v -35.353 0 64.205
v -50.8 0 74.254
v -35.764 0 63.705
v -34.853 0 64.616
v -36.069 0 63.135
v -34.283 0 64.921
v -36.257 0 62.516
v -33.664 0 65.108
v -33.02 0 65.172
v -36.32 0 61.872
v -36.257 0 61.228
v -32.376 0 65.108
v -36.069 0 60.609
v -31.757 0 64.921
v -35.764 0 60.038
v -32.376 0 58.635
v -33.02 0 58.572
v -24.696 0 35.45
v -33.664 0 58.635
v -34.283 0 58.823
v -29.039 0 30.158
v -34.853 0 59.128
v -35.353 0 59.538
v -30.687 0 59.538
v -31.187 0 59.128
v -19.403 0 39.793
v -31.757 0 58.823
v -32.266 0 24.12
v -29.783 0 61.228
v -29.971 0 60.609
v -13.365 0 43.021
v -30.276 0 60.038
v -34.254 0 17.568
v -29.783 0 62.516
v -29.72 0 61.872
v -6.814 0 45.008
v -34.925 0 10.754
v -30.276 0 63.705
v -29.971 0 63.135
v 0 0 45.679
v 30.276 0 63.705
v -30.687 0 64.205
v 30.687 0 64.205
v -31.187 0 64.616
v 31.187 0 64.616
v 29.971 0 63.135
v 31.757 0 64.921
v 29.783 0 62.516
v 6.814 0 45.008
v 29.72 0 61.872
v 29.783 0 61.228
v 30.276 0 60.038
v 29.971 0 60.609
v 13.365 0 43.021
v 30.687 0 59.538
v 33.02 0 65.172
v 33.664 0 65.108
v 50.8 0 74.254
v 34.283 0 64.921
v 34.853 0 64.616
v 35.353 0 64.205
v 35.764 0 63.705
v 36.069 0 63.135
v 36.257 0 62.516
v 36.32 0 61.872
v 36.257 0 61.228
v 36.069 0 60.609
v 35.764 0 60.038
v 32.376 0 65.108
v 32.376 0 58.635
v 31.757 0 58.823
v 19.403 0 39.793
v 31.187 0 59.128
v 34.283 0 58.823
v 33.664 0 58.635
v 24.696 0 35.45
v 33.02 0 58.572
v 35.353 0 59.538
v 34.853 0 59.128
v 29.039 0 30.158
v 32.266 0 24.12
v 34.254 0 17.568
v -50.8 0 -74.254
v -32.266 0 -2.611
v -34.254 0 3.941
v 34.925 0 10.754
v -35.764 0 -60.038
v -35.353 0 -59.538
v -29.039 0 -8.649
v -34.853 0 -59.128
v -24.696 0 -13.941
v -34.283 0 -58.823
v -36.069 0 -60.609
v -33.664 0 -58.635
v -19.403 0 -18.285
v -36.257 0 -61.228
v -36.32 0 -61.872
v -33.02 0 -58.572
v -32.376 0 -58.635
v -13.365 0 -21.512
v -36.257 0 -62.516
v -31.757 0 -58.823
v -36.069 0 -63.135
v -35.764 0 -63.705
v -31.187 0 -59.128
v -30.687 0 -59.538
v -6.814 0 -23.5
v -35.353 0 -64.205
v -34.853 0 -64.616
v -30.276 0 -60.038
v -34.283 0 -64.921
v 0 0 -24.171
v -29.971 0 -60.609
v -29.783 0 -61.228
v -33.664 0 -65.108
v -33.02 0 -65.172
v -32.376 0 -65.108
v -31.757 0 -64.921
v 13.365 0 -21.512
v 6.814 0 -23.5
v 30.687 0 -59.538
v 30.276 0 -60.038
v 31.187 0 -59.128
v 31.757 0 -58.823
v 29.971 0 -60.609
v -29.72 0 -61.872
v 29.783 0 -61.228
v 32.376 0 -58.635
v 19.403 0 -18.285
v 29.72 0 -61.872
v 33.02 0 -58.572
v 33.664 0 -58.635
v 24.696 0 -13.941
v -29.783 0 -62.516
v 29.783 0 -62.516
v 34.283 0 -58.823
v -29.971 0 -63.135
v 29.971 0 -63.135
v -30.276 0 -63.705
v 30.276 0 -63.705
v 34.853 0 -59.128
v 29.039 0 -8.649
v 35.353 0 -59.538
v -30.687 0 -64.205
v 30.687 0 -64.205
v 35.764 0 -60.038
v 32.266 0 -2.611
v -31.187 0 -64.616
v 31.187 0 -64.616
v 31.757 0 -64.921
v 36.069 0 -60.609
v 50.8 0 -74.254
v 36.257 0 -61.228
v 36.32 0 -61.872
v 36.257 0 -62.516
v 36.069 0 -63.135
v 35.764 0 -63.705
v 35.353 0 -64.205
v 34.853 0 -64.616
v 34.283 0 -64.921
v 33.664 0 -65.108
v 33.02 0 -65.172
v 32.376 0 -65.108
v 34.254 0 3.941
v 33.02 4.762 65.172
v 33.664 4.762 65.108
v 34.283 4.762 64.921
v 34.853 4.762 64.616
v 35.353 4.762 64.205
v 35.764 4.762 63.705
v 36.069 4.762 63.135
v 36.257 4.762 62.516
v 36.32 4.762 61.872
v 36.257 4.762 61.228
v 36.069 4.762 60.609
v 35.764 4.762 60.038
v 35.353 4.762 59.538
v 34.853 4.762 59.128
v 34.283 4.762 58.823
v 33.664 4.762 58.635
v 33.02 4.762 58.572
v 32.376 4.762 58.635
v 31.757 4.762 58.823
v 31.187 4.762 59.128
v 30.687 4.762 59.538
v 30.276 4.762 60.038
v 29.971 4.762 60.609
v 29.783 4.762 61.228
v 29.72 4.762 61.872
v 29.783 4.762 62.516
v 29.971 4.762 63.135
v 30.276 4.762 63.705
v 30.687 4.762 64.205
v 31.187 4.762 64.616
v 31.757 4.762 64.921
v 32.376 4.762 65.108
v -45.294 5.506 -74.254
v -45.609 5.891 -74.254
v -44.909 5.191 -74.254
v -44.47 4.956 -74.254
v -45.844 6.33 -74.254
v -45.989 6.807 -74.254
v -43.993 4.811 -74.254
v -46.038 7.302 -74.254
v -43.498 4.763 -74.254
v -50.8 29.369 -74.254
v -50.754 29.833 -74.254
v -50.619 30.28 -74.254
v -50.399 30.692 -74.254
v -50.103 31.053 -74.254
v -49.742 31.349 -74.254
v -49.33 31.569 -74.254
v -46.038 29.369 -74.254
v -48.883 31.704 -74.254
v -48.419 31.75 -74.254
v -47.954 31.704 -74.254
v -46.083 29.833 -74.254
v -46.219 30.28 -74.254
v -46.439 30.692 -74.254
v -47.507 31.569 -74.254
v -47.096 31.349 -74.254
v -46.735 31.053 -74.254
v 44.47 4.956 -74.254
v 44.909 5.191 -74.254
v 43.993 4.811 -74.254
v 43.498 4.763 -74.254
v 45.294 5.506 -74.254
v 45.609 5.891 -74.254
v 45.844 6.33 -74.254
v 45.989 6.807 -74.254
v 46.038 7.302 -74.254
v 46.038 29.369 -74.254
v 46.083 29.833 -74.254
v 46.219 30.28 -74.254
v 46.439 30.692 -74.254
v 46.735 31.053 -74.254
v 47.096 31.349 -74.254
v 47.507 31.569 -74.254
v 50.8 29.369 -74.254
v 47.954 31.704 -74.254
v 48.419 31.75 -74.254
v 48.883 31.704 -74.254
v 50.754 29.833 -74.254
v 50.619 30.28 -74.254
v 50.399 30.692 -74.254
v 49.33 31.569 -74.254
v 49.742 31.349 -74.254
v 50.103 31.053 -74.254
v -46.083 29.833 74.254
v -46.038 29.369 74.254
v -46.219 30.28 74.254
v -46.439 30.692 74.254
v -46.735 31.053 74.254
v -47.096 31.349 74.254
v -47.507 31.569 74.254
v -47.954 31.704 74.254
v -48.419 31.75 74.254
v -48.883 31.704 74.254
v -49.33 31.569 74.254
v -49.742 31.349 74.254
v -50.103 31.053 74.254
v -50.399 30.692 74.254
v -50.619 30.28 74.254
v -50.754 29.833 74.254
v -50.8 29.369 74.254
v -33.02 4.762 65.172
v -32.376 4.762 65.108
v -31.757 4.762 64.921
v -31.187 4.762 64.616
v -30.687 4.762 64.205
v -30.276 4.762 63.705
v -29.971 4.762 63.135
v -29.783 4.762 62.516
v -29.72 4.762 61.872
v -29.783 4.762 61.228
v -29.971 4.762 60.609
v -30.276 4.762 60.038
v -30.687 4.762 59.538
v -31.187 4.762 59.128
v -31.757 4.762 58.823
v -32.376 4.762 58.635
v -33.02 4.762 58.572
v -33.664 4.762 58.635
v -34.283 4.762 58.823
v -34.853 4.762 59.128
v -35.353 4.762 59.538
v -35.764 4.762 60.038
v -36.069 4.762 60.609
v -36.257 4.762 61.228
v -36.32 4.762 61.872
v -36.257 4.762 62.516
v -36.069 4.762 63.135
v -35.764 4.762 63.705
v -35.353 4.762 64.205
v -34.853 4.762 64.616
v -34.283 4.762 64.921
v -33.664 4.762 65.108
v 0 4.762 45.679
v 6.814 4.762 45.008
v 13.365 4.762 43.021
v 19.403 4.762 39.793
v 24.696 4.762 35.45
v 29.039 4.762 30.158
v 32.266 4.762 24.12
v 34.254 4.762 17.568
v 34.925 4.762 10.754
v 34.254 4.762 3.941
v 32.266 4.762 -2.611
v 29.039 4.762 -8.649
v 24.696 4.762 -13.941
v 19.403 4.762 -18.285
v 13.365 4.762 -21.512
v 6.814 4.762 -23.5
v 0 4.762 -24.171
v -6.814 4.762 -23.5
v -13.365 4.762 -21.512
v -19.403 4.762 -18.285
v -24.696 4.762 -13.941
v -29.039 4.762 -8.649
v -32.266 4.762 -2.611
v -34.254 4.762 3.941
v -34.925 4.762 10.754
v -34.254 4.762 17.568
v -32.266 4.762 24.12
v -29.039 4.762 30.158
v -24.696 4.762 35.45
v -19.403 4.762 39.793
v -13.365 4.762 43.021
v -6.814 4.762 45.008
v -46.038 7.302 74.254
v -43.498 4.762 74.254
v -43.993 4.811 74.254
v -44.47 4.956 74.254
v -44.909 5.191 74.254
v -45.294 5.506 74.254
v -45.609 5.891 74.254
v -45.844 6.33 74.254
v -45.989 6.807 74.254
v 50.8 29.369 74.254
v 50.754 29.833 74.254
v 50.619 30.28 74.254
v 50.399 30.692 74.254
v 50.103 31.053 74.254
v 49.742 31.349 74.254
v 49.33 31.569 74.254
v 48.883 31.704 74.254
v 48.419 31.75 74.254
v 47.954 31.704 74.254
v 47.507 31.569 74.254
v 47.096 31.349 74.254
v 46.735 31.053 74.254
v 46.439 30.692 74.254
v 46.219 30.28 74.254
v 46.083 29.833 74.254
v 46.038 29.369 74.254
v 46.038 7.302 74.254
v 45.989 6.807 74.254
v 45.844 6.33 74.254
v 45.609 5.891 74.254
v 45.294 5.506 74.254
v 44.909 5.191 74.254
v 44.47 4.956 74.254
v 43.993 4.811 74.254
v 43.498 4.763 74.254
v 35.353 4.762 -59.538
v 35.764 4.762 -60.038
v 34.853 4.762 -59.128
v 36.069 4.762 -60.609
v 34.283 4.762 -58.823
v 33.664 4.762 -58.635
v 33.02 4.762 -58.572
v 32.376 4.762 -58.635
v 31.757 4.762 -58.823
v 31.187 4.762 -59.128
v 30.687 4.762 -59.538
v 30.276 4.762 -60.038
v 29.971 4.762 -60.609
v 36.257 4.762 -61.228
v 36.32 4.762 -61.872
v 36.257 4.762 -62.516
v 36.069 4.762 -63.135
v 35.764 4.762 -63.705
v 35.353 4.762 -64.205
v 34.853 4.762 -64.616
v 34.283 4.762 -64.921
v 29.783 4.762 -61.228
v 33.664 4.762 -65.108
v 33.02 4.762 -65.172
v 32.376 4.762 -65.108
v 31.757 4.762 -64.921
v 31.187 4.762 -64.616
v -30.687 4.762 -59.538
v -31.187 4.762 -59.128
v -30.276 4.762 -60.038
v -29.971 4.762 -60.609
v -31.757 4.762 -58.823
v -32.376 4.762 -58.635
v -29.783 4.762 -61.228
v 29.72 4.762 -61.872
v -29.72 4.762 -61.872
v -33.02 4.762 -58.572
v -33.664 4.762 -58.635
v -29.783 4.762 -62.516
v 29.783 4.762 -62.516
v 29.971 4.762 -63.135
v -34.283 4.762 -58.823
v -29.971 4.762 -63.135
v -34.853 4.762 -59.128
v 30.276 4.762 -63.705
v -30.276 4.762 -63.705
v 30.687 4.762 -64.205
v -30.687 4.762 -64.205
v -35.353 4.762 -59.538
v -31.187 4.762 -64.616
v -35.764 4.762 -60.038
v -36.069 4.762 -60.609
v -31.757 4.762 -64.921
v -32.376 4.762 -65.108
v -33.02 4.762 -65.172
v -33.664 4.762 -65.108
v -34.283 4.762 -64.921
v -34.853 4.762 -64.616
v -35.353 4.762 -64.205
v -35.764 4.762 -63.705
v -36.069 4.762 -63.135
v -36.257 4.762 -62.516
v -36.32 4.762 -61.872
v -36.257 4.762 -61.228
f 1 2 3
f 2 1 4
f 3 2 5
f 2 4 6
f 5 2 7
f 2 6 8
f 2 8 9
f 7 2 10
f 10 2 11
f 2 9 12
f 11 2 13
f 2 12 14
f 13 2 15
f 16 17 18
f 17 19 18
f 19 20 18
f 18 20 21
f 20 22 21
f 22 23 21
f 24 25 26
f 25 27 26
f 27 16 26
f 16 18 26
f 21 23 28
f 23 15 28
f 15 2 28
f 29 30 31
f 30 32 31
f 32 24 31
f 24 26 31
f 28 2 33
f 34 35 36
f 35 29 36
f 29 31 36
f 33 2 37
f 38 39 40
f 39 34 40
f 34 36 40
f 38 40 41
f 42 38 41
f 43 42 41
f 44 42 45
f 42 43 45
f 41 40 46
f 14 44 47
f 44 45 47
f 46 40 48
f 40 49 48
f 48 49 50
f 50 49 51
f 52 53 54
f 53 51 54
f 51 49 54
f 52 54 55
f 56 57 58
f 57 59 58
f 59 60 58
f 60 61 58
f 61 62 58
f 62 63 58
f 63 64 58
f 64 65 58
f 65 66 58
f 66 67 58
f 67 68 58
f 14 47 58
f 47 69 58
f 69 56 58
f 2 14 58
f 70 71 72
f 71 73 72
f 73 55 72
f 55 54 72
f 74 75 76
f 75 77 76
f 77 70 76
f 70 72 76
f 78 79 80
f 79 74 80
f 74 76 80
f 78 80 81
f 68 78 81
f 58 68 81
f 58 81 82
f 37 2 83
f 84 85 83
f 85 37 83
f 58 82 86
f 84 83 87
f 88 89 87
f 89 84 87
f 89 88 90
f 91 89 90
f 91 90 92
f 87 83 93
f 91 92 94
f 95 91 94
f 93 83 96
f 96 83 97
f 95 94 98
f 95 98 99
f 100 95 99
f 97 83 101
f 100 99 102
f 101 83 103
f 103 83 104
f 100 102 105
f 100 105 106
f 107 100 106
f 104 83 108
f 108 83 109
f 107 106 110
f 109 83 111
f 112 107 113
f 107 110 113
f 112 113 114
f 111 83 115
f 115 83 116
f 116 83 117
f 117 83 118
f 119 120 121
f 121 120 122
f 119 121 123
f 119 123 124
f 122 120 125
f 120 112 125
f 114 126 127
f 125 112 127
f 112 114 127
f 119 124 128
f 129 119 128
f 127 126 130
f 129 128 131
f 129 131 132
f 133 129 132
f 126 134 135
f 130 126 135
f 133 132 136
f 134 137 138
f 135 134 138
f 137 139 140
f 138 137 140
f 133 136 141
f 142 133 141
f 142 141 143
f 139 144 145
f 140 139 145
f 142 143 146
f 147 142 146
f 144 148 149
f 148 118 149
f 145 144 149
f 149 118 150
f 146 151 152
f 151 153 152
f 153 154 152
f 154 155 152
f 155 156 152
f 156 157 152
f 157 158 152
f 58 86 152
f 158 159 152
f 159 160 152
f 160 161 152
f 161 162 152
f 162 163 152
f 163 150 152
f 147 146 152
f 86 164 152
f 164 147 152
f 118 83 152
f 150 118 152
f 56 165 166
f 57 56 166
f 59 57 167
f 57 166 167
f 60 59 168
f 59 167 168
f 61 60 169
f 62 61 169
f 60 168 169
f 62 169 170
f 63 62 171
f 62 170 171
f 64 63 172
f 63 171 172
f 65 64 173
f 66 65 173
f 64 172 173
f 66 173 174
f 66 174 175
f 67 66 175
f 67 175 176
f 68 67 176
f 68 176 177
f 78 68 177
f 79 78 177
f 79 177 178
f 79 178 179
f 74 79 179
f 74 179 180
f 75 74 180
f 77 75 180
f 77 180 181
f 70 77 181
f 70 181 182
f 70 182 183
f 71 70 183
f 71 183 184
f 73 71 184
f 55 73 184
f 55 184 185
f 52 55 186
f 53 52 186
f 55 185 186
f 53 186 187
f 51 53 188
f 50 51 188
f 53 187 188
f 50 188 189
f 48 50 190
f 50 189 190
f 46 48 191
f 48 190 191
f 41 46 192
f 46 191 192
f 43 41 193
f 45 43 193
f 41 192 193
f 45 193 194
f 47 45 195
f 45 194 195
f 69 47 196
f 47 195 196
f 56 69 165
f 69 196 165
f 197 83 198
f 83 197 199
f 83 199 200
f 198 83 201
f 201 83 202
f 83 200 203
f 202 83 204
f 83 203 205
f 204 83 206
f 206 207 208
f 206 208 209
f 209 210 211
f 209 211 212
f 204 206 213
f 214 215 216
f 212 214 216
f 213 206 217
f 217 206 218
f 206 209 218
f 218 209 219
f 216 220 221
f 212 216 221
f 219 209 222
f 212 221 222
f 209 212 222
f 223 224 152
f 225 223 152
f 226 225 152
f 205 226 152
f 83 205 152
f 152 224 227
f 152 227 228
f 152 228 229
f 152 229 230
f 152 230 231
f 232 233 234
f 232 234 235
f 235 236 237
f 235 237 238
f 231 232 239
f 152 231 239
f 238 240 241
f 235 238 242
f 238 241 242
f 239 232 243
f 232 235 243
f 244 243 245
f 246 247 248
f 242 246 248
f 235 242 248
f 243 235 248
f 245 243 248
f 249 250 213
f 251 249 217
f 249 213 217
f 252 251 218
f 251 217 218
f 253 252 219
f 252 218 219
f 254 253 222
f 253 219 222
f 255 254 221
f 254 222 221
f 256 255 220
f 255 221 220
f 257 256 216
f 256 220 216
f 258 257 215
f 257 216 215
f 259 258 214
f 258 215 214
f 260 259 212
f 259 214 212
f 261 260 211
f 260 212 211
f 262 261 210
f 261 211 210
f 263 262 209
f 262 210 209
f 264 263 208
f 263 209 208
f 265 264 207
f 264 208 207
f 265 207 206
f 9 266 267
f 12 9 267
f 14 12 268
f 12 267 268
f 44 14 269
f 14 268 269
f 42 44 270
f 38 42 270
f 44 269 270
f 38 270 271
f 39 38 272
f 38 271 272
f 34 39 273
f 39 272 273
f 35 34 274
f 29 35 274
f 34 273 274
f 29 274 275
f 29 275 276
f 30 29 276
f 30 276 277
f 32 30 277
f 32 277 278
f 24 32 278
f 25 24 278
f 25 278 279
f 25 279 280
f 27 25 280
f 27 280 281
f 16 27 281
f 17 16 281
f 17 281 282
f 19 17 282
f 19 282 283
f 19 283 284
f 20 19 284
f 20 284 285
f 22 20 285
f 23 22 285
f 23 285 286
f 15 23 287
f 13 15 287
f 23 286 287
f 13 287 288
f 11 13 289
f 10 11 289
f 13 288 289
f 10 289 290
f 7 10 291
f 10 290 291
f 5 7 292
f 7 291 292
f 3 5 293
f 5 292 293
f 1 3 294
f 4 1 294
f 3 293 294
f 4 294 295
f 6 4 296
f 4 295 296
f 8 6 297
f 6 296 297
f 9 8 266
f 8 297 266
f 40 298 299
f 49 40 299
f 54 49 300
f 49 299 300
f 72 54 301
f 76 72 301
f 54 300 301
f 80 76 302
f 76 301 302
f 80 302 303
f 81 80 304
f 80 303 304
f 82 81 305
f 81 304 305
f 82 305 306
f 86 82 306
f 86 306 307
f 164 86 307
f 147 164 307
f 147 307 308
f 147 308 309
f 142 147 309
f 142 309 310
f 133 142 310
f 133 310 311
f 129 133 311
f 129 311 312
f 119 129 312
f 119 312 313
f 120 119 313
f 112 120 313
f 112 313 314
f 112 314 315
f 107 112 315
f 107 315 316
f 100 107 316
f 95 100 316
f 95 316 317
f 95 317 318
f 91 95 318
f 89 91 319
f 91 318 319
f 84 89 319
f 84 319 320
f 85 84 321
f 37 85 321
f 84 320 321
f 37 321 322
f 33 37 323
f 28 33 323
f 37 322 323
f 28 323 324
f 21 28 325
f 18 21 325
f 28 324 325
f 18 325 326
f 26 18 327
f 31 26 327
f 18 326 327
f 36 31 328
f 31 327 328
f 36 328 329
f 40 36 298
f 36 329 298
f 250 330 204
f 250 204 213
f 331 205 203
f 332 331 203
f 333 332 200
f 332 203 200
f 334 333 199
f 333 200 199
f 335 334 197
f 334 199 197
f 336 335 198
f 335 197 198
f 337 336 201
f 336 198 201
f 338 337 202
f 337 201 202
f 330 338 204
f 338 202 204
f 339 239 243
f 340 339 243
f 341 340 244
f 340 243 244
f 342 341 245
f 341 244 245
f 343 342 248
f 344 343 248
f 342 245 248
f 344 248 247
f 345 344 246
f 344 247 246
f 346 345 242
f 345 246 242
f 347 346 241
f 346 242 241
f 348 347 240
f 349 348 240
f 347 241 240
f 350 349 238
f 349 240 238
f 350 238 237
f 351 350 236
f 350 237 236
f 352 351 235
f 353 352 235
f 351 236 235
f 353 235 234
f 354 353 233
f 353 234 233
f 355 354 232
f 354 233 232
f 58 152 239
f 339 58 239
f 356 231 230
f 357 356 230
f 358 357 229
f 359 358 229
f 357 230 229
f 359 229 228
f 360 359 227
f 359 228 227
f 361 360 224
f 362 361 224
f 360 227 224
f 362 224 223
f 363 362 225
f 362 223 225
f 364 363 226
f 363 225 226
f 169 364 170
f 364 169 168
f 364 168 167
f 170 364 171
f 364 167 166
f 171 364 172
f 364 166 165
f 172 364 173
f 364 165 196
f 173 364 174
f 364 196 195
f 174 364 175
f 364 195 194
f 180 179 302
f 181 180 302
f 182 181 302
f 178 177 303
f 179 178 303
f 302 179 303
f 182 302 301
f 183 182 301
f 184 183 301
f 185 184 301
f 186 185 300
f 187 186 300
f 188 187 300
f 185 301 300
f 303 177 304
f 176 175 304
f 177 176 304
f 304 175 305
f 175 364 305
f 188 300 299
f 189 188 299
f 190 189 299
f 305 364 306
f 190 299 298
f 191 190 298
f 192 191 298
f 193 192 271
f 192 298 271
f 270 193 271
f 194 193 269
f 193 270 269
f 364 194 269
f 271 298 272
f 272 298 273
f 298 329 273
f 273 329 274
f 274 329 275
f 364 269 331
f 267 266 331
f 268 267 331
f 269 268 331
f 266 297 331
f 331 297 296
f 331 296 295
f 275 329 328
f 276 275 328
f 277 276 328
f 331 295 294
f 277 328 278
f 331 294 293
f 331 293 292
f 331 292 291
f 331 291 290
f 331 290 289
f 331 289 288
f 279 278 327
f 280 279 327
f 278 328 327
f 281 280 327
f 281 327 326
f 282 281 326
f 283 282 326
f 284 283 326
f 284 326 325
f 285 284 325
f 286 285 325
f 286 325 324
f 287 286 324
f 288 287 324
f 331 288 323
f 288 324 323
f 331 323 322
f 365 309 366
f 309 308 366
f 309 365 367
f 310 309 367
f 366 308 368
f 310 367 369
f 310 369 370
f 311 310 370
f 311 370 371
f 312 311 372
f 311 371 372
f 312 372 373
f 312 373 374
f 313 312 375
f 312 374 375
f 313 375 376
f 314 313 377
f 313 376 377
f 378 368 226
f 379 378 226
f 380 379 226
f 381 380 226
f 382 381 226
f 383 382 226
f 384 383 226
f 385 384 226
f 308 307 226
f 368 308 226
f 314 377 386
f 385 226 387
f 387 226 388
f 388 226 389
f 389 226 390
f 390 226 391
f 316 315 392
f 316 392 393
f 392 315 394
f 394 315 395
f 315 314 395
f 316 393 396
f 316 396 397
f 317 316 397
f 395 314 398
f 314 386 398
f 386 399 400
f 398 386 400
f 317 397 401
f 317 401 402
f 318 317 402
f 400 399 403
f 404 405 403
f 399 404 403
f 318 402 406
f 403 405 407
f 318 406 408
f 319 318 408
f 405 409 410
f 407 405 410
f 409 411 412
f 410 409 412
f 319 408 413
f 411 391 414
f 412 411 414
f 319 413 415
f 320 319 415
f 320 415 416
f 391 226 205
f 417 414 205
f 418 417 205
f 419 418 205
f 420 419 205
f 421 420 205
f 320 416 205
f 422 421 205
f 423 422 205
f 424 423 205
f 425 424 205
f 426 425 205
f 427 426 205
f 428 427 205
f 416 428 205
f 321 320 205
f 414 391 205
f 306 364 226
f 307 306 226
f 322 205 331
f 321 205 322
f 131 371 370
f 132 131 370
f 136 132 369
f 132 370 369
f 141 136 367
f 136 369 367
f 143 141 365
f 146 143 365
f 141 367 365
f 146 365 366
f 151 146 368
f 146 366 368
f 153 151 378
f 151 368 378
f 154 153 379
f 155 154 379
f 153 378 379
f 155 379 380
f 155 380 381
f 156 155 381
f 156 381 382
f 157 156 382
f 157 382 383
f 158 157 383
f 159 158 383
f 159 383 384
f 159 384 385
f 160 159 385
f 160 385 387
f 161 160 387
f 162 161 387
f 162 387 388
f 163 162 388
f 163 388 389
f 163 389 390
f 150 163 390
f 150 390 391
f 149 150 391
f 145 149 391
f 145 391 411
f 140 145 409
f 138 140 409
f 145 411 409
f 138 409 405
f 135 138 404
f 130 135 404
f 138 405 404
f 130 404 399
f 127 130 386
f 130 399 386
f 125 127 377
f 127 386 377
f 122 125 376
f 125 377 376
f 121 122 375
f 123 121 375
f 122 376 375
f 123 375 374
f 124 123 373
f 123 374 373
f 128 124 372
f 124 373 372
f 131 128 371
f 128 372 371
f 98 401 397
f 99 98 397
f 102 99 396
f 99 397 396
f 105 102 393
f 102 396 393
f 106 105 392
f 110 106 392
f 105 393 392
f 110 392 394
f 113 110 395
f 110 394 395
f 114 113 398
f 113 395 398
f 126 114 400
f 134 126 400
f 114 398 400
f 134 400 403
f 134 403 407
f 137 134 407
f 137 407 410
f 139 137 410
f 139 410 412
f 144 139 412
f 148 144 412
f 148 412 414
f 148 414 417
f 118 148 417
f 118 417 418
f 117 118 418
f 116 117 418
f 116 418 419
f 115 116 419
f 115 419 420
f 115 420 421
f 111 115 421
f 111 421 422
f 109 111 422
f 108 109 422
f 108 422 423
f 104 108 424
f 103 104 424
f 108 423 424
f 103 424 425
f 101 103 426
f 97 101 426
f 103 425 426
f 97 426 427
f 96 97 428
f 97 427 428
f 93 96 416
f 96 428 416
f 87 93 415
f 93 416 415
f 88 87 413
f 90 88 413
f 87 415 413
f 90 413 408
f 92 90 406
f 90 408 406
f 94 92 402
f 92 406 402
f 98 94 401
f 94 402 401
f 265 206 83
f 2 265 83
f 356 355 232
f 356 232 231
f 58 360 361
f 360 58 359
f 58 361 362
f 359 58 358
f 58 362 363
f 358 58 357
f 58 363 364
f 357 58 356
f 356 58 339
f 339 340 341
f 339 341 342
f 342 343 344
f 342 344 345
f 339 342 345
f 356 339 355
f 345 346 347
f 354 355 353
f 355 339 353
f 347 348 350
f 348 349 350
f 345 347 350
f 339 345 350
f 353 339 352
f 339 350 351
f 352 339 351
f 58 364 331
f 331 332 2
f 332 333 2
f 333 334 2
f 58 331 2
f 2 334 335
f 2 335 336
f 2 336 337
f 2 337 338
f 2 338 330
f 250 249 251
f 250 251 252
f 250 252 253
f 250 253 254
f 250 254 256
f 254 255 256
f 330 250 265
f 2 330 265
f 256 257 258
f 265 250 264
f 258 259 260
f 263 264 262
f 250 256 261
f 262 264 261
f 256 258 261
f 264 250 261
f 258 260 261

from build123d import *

# Parameters (mm, degrees)
EXTRUDE_THIN1_DEPTH  = 74.25436
FILLET1_RADIUS       = 2.38125
FILLET1_LENGTH       = 74.25436
FILLET2_R            = 2.54
MIRROR1_START        = -74.25436
MIRROR1_DEPTH        = 148.50872
M6_CLEARANCE_HOLE1_D = 6.6
SKETCH11_R           = 34.925
CUT_EXTRUDE4_DEPTH   = 94.929096319


# Read off the part's stored shape, not the designer's step: Mirror1
with BuildPart() as part:
    # Sketch4 → Extrude-Thin1 (new body)
    with BuildSketch(Plane.XY):
        Polygon((0, 0), (-50.8, 0), (-50.8, 31.75), (-46.0375, 31.75), (-46.0375, 4.7625), (0, 4.7625), align=None)
    extrude(amount=EXTRUDE_THIN1_DEPTH)

    # Fillet1: full round fillet: the end face becomes a half cylinder, R = half its width
    fillet1_face = Plane((-48.41875, 31.75, 37.12718), x_dir=(0, 0, -1), z_dir=(0, 1, 0))  # on the end face: x along it, z out of the body
    fillet1_slab = fillet1_face.offset(-FILLET1_RADIUS / 2) * Box(FILLET1_LENGTH, 2 * FILLET1_RADIUS, FILLET1_RADIUS, mode=Mode.PRIVATE)  # the body's end, R deep
    fillet1_round = Plane((-48.41875, 29.36875, 37.12718), x_dir=(0, 1, 0), z_dir=(0, 0, -1)) * Cylinder(FILLET1_RADIUS, FILLET1_LENGTH, mode=Mode.PRIVATE)  # its axis R under the face
    add(fillet1_slab - fillet1_round, mode=Mode.SUBTRACT)

    # Fillet2
    fillet2_edges = [part.edges().sort_by_distance(p)[0] for p in [
        (-46.0375, 4.7625, 37.12718),
    ]]
    fillet(fillet2_edges, radius=FILLET2_R)

    # Mirror1 outline → Mirror1 (add)
    with BuildSketch(Plane.XY.offset(MIRROR1_START)):
        with BuildLine():
            ThreePointArc((-46.0375, 29.36875), (-48.41875, 31.75), (-50.8, 29.36875))
            Line((-50.8, 29.36875), (-50.8, 0))
            Line((-50.8, 0), (50.8, 0))
            Line((50.8, 0), (50.8, 29.36875))
            ThreePointArc((50.8, 29.36875), (48.41875, 31.75), (46.0375, 29.36875))
            Line((46.0375, 29.36875), (46.0375, 7.3025))
            ThreePointArc((46.0375, 7.3025), (45.293551224, 5.506448776), (43.4975, 4.7625))
            Line((43.4975, 4.7625), (-43.4975, 4.7625))
            ThreePointArc((-43.4975, 4.7625), (-45.293551224, 5.506448776), (-46.0375, 7.3025))
            Line((-46.0375, 7.3025), (-46.0375, 29.36875))
        make_face()
    extrude(amount=MIRROR1_DEPTH)

    # M6 Clearance Hole1 (through all)
    with Locations(Plane(origin=(-33.02, 0, 61.87186), x_dir=(0, 0, -1), z_dir=(0, -1, 0))):
        with Locations((0, 0), (0, 66.04), (123.74372, 0), (123.74372, 66.04)):
            Hole(M6_CLEARANCE_HOLE1_D / 2)

    # Sketch11 → Cut-Extrude4 (cut, through all)
    with BuildSketch(Plane(origin=(0, 4.7625, 0), x_dir=(1, 0, 0), z_dir=(0, 1, 0))):
        with Locations(Location((0, -10.75436, 0), (0, 0, 270))):
            Circle(SKETCH11_R)
    extrude(amount=-CUT_EXTRUDE4_DEPTH, mode=Mode.SUBTRACT)


solid = part.part
